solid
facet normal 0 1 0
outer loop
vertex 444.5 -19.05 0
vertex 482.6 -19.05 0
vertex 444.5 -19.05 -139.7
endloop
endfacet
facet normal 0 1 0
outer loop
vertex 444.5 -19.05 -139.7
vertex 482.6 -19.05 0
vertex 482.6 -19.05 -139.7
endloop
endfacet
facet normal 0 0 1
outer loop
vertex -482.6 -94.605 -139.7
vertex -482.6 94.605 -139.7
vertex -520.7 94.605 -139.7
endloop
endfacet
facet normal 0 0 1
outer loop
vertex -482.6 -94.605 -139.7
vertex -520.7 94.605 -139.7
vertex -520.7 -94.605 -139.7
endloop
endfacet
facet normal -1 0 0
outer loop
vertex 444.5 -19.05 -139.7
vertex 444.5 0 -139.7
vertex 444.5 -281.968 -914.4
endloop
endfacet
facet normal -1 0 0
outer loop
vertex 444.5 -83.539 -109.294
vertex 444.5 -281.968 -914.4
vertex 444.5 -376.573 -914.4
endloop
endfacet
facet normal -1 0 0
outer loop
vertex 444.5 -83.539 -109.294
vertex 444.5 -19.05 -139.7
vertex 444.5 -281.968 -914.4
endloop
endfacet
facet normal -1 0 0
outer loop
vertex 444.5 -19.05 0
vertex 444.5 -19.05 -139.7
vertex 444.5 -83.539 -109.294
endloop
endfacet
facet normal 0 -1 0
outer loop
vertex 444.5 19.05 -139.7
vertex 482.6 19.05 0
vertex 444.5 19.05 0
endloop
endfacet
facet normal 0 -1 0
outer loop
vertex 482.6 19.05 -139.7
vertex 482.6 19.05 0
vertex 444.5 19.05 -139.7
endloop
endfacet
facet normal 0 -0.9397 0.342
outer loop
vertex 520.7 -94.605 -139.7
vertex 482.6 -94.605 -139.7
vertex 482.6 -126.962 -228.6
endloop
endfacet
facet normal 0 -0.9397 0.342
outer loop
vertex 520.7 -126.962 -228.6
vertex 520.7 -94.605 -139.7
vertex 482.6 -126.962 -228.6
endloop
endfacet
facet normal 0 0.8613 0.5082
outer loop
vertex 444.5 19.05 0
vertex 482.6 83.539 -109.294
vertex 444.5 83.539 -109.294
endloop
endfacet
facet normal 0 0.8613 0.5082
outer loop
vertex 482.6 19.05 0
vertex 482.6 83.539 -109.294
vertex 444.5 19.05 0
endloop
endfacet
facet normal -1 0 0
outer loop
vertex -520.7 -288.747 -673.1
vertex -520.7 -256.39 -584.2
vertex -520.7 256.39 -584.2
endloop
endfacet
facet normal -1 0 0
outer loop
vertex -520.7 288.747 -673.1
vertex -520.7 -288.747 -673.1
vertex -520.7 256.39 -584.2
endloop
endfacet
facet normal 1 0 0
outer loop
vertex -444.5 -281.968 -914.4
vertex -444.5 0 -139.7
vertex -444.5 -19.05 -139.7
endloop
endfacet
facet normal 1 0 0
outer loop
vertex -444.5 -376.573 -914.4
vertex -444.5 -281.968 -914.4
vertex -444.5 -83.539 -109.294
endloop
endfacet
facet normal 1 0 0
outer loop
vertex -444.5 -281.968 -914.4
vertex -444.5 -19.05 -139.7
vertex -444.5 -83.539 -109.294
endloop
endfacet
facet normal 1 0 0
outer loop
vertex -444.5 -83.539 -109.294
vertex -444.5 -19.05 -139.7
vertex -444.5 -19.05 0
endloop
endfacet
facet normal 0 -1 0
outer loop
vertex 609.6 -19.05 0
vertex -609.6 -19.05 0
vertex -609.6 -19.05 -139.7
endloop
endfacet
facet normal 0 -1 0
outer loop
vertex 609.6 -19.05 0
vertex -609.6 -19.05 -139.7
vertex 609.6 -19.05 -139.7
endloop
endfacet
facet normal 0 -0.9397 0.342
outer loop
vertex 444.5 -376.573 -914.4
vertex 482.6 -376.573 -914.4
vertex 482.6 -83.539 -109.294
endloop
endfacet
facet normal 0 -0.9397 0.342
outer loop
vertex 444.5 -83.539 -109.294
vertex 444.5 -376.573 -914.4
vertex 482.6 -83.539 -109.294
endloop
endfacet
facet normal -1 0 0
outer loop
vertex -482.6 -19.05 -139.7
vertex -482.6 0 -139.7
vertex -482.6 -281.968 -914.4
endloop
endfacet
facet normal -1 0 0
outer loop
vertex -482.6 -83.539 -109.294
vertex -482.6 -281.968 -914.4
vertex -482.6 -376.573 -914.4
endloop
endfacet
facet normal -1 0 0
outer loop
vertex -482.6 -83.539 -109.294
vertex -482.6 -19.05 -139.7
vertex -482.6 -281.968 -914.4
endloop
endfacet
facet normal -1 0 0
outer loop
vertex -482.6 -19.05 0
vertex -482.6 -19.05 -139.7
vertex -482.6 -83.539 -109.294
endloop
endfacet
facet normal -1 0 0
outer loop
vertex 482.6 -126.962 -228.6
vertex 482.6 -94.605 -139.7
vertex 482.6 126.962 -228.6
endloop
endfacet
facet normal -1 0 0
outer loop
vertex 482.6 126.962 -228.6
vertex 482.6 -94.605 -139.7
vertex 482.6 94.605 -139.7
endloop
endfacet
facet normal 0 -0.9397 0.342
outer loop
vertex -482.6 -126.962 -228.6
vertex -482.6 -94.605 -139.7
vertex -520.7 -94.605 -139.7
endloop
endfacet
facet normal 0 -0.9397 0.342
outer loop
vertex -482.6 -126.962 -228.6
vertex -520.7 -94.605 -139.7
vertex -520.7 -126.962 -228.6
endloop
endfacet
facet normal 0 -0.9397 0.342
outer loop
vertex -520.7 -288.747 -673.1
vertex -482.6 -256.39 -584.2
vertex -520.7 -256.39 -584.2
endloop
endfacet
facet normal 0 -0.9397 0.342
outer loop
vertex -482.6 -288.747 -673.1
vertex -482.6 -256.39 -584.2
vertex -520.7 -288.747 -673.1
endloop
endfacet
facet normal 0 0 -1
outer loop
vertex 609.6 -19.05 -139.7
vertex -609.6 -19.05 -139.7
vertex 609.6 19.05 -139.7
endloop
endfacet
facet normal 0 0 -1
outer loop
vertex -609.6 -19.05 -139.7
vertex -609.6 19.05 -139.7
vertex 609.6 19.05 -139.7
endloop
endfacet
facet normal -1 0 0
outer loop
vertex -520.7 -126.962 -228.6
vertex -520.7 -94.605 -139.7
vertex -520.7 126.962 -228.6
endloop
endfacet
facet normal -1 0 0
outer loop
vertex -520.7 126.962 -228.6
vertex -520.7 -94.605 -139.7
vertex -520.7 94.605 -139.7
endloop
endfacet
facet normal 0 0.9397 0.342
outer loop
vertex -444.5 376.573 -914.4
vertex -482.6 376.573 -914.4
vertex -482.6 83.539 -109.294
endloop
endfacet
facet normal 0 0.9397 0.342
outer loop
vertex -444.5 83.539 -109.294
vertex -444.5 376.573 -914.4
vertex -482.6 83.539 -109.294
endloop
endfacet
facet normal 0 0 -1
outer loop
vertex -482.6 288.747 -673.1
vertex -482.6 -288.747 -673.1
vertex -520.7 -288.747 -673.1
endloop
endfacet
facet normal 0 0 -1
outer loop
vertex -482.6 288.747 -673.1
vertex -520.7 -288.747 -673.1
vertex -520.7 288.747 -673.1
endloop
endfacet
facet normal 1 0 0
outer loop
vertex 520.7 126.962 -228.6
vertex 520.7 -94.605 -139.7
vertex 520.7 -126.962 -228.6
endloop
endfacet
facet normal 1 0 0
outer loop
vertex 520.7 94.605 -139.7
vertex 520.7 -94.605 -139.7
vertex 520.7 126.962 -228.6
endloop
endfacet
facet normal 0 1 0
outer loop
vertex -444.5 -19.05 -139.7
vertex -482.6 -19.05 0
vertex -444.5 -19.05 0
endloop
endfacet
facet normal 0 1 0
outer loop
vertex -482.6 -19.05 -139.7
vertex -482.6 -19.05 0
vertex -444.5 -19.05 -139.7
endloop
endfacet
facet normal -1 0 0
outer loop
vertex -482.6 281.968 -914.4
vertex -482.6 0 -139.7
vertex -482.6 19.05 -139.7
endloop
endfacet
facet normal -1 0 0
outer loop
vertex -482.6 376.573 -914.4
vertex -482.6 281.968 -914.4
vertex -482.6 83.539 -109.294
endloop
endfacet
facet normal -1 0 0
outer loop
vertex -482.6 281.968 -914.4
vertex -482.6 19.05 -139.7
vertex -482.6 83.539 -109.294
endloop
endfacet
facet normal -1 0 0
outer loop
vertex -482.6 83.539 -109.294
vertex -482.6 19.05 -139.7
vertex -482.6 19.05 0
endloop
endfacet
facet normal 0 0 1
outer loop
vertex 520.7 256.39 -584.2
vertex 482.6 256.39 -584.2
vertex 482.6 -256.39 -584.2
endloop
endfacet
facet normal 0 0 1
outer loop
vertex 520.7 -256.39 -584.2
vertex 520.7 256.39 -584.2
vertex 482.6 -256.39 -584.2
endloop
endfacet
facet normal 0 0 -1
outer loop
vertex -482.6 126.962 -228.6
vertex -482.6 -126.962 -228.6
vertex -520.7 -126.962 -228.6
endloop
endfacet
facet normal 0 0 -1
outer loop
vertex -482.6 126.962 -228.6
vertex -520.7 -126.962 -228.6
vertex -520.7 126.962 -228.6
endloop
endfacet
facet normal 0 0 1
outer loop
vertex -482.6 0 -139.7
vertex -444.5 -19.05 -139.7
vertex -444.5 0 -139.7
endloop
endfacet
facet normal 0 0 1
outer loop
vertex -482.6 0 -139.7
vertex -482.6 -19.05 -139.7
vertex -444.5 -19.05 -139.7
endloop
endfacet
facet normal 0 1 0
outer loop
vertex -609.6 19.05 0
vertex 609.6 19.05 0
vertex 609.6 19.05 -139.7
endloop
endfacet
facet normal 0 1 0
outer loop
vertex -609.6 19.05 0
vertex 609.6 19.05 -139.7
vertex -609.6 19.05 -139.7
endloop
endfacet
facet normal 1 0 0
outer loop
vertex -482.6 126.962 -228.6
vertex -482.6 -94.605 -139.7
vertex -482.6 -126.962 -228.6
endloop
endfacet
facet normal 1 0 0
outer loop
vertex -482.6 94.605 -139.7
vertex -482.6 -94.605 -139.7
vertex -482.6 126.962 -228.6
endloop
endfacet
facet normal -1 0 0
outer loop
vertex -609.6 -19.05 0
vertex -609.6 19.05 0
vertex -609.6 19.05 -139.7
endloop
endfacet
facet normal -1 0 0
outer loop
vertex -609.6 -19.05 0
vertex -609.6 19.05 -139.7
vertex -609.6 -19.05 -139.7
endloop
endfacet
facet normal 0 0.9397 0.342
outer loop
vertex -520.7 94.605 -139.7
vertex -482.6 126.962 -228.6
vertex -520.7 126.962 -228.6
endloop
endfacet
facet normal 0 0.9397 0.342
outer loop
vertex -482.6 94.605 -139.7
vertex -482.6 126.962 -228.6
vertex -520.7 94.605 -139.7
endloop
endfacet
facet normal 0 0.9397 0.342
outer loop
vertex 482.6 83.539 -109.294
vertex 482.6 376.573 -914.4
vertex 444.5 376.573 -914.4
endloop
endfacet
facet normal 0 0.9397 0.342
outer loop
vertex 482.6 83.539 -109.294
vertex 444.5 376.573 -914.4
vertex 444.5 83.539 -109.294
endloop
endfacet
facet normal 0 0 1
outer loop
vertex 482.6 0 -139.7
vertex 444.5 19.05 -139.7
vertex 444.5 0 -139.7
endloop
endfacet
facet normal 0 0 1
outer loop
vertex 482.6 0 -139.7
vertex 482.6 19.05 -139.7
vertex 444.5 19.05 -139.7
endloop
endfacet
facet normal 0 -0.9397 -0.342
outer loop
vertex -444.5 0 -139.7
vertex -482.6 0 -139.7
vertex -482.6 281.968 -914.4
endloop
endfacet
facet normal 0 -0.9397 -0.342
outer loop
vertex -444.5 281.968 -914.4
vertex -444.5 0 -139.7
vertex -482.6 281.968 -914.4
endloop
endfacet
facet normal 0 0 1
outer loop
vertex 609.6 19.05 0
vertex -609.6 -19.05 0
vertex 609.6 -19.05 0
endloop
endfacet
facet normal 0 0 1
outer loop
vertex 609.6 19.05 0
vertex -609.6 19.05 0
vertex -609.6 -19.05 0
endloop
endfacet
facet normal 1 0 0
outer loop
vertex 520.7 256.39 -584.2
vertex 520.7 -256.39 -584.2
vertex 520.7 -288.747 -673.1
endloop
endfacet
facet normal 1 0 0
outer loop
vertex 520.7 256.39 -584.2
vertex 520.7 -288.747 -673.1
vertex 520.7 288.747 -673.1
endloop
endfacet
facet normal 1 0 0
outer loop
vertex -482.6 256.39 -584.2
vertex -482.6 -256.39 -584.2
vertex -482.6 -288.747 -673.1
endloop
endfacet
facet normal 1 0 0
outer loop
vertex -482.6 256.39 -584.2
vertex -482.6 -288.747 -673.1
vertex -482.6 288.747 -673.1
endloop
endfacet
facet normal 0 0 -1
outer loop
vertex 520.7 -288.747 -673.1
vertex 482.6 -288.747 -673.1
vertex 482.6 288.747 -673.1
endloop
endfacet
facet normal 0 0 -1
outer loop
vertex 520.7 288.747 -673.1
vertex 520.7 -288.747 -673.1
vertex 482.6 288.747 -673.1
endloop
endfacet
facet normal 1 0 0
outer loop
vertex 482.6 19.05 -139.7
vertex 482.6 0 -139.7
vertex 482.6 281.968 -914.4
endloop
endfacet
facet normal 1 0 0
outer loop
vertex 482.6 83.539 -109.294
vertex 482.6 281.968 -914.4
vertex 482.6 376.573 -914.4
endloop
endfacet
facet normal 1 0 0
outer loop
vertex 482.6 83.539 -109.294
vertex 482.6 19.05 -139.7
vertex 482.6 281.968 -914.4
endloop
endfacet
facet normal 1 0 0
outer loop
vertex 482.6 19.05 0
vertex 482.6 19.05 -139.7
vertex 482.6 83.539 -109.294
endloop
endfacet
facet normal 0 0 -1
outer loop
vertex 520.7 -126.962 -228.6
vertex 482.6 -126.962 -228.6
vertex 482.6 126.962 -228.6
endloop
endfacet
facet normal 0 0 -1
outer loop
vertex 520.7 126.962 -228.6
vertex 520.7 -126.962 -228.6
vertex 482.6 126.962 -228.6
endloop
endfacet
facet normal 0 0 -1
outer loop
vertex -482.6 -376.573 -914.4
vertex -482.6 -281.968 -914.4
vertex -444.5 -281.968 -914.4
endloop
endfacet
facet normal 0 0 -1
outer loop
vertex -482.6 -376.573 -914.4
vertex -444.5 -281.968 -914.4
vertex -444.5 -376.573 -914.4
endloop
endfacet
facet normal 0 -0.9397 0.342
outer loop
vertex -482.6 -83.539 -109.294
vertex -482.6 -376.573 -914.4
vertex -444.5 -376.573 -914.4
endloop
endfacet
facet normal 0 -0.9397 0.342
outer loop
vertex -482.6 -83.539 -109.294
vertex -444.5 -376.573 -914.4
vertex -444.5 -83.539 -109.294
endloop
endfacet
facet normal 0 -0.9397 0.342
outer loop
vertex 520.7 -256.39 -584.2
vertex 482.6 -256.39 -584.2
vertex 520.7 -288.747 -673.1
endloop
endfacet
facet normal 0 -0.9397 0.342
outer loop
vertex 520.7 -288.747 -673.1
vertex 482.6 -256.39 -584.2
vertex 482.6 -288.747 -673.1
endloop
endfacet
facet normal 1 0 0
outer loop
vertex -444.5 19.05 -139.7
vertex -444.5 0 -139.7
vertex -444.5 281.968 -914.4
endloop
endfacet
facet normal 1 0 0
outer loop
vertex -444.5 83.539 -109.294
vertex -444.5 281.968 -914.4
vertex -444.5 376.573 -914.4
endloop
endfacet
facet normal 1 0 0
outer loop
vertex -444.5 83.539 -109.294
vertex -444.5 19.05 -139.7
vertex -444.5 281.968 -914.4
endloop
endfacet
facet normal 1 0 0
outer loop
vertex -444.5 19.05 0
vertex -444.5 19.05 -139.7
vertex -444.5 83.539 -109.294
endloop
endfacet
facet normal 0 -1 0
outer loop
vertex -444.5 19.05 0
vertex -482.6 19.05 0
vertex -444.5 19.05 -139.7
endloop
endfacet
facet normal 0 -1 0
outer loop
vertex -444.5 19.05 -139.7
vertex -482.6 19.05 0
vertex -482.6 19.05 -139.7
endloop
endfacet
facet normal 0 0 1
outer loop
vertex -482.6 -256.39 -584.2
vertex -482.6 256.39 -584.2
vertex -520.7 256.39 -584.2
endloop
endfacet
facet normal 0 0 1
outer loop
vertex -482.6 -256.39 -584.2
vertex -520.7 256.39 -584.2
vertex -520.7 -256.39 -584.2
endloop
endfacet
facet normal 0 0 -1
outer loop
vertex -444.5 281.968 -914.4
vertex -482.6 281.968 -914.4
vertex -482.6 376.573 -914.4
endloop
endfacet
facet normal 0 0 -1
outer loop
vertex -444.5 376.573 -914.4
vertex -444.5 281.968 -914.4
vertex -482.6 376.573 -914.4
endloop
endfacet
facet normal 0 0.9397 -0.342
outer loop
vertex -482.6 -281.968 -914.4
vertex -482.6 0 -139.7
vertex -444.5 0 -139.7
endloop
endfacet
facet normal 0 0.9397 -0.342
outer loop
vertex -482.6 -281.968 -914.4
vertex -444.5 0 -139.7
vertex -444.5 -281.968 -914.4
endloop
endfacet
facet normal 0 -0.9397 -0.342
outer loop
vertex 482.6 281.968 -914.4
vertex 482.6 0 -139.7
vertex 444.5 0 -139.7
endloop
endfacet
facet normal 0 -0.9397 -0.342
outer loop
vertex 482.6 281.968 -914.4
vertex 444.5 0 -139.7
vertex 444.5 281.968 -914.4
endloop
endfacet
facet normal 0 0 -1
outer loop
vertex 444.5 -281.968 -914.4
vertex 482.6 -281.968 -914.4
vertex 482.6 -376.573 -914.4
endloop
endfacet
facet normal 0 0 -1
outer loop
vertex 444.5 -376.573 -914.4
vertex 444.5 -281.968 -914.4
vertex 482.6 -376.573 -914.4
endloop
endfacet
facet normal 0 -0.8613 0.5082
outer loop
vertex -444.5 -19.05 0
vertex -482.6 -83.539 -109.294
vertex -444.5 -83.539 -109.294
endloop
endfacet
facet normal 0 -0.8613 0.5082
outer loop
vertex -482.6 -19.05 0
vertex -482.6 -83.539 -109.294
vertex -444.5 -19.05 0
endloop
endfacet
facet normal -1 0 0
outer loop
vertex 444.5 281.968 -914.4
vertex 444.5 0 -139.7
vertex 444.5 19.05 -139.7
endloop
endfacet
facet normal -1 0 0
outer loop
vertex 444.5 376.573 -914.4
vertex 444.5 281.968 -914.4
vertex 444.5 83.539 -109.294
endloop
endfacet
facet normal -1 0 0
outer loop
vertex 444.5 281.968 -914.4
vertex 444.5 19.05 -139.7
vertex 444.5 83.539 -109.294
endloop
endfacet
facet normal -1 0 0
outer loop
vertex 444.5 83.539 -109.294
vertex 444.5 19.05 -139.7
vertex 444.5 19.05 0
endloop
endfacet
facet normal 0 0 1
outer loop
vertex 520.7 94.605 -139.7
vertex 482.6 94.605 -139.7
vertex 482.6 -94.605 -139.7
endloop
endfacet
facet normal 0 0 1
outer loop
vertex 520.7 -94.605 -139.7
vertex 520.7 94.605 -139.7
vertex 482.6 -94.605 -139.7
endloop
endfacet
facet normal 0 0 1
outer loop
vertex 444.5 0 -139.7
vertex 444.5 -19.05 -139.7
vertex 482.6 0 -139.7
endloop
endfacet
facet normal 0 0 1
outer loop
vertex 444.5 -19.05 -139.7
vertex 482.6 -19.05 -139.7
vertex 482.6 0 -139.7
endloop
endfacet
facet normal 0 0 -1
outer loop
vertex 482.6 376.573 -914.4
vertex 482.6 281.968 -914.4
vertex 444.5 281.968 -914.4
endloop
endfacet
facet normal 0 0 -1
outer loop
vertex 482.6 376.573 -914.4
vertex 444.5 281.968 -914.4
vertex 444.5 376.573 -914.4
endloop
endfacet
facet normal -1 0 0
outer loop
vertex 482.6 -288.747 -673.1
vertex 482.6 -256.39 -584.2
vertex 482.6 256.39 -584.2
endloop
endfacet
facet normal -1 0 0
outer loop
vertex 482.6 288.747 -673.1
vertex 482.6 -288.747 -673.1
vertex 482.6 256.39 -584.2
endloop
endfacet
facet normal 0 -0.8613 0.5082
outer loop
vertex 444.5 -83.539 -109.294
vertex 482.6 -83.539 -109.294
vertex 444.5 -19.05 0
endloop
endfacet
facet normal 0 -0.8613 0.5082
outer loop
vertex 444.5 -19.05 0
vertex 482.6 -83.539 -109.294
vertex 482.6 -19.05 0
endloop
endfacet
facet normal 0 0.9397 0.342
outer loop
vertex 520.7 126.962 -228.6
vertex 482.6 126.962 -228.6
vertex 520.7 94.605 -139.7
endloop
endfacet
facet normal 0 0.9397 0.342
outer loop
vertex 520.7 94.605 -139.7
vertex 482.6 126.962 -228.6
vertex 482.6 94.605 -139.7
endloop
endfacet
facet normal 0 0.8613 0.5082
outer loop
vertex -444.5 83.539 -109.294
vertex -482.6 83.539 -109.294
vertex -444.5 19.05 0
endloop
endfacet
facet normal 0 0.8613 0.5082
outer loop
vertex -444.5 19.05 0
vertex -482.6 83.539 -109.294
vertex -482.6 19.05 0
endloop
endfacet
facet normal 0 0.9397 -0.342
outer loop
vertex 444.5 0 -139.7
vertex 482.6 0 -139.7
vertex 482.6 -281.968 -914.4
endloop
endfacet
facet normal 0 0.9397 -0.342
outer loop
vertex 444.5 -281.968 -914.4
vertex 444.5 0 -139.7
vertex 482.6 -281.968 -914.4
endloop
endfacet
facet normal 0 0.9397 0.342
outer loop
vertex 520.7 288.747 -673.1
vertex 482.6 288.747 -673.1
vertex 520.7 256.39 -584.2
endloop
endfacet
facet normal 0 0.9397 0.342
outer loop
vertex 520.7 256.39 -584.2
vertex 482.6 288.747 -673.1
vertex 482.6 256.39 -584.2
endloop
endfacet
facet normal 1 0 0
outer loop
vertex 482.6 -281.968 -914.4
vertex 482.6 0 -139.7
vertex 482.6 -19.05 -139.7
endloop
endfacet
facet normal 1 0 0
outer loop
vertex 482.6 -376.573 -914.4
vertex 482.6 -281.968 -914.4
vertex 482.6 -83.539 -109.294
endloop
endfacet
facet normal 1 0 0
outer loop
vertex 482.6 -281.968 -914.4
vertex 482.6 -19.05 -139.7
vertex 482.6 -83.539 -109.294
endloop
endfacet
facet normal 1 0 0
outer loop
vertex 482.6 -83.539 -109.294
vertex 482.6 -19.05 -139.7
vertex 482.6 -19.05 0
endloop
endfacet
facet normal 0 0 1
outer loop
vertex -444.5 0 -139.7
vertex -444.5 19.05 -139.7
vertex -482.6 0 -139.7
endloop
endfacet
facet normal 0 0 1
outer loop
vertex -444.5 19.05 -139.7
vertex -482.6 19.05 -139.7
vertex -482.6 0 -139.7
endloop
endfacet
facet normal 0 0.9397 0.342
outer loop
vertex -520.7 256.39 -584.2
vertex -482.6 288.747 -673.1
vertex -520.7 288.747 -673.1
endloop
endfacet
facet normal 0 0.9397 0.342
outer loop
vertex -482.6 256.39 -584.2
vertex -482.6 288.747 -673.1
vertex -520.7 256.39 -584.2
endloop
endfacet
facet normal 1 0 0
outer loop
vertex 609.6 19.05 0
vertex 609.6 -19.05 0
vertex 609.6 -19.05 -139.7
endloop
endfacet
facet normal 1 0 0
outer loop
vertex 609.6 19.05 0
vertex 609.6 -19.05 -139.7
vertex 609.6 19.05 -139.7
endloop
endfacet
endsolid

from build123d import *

# Parameters (mm, degrees)
F1_DEPTH = 139.7
F4_DEPTH = 19.05
F8_DEPTH = 38.1
F9_DEPTH = 38.1


with BuildPart() as f1:
    # F0 (on Top) → F1 (new body)
    with BuildSketch(Plane.XY):
        Polygon((-609.6, -19.05), (0, -19.05), (609.6, -19.05), (609.6, 19.05), (0, 19.05), (-609.6, 19.05), align=None)
    extrude(amount=-F1_DEPTH)


with BuildPart() as f4:
    # F3 (on offset) → F4 (new body, symmetric)
    with BuildSketch(Plane(origin=(-463.55, 0, 0), x_dir=(0, -1, 0), z_dir=(-1, 0, 0))):
        Polygon((19.05, -139.7), (0, -139.7), (281.967740486, -914.4), (376.5731444591, -914.4), (83.5386739879, -109.2944092583), (19.05, 0), align=None)
    extrude(amount=F4_DEPTH, both=True)


with BuildPart() as f5_1:
    # F5: instance of F4
    add(f4.part.mirror(Plane.XZ))


with BuildPart() as f6_1:
    # F6: instance of F4
    add(f4.part.mirror(Plane.YZ))


with BuildPart() as f6_2:
    # F6: instance of F5_1
    add(f5_1.part.mirror(Plane.YZ))


with BuildPart() as f8:
    # F7 (on face) → F8 (new body)
    with BuildSketch(Plane.YZ.offset(482.6)):
        Polygon((-19.05, -139.7), (-94.6054039731, -139.7), (-126.9623577994, -228.6), (-32.3569538263, -228.6), (0, -139.7), align=None)
        Polygon((0, -139.7), (-32.3569538263, -228.6), (126.9623577994, -228.6), (94.6054039731, -139.7), (19.05, -139.7), align=None)
    extrude(amount=F8_DEPTH)


with BuildPart() as f9:
    # F7 (on face) → F9 (new body)
    with BuildSketch(Plane.YZ.offset(482.6)):
        Polygon((-161.7847691313, -584.2), (-256.3901731044, -584.2), (-288.7471269307, -673.1), (-194.1417229576, -673.1), align=None)
        Polygon((256.3901731044, -584.2), (-161.7847691313, -584.2), (-194.1417229576, -673.1), (288.7471269307, -673.1), align=None)
    extrude(amount=F9_DEPTH)


with BuildPart() as f10_1:
    # F10: instance of F8
    add(f8.part.mirror(Plane.YZ))


with BuildPart() as f10_2:
    # F10: instance of F9
    add(f9.part.mirror(Plane.YZ))


solid = Compound([f1.part, f4.part, f5_1.part, f6_1.part, f6_2.part, f8.part, f9.part, f10_1.part, f10_2.part])
